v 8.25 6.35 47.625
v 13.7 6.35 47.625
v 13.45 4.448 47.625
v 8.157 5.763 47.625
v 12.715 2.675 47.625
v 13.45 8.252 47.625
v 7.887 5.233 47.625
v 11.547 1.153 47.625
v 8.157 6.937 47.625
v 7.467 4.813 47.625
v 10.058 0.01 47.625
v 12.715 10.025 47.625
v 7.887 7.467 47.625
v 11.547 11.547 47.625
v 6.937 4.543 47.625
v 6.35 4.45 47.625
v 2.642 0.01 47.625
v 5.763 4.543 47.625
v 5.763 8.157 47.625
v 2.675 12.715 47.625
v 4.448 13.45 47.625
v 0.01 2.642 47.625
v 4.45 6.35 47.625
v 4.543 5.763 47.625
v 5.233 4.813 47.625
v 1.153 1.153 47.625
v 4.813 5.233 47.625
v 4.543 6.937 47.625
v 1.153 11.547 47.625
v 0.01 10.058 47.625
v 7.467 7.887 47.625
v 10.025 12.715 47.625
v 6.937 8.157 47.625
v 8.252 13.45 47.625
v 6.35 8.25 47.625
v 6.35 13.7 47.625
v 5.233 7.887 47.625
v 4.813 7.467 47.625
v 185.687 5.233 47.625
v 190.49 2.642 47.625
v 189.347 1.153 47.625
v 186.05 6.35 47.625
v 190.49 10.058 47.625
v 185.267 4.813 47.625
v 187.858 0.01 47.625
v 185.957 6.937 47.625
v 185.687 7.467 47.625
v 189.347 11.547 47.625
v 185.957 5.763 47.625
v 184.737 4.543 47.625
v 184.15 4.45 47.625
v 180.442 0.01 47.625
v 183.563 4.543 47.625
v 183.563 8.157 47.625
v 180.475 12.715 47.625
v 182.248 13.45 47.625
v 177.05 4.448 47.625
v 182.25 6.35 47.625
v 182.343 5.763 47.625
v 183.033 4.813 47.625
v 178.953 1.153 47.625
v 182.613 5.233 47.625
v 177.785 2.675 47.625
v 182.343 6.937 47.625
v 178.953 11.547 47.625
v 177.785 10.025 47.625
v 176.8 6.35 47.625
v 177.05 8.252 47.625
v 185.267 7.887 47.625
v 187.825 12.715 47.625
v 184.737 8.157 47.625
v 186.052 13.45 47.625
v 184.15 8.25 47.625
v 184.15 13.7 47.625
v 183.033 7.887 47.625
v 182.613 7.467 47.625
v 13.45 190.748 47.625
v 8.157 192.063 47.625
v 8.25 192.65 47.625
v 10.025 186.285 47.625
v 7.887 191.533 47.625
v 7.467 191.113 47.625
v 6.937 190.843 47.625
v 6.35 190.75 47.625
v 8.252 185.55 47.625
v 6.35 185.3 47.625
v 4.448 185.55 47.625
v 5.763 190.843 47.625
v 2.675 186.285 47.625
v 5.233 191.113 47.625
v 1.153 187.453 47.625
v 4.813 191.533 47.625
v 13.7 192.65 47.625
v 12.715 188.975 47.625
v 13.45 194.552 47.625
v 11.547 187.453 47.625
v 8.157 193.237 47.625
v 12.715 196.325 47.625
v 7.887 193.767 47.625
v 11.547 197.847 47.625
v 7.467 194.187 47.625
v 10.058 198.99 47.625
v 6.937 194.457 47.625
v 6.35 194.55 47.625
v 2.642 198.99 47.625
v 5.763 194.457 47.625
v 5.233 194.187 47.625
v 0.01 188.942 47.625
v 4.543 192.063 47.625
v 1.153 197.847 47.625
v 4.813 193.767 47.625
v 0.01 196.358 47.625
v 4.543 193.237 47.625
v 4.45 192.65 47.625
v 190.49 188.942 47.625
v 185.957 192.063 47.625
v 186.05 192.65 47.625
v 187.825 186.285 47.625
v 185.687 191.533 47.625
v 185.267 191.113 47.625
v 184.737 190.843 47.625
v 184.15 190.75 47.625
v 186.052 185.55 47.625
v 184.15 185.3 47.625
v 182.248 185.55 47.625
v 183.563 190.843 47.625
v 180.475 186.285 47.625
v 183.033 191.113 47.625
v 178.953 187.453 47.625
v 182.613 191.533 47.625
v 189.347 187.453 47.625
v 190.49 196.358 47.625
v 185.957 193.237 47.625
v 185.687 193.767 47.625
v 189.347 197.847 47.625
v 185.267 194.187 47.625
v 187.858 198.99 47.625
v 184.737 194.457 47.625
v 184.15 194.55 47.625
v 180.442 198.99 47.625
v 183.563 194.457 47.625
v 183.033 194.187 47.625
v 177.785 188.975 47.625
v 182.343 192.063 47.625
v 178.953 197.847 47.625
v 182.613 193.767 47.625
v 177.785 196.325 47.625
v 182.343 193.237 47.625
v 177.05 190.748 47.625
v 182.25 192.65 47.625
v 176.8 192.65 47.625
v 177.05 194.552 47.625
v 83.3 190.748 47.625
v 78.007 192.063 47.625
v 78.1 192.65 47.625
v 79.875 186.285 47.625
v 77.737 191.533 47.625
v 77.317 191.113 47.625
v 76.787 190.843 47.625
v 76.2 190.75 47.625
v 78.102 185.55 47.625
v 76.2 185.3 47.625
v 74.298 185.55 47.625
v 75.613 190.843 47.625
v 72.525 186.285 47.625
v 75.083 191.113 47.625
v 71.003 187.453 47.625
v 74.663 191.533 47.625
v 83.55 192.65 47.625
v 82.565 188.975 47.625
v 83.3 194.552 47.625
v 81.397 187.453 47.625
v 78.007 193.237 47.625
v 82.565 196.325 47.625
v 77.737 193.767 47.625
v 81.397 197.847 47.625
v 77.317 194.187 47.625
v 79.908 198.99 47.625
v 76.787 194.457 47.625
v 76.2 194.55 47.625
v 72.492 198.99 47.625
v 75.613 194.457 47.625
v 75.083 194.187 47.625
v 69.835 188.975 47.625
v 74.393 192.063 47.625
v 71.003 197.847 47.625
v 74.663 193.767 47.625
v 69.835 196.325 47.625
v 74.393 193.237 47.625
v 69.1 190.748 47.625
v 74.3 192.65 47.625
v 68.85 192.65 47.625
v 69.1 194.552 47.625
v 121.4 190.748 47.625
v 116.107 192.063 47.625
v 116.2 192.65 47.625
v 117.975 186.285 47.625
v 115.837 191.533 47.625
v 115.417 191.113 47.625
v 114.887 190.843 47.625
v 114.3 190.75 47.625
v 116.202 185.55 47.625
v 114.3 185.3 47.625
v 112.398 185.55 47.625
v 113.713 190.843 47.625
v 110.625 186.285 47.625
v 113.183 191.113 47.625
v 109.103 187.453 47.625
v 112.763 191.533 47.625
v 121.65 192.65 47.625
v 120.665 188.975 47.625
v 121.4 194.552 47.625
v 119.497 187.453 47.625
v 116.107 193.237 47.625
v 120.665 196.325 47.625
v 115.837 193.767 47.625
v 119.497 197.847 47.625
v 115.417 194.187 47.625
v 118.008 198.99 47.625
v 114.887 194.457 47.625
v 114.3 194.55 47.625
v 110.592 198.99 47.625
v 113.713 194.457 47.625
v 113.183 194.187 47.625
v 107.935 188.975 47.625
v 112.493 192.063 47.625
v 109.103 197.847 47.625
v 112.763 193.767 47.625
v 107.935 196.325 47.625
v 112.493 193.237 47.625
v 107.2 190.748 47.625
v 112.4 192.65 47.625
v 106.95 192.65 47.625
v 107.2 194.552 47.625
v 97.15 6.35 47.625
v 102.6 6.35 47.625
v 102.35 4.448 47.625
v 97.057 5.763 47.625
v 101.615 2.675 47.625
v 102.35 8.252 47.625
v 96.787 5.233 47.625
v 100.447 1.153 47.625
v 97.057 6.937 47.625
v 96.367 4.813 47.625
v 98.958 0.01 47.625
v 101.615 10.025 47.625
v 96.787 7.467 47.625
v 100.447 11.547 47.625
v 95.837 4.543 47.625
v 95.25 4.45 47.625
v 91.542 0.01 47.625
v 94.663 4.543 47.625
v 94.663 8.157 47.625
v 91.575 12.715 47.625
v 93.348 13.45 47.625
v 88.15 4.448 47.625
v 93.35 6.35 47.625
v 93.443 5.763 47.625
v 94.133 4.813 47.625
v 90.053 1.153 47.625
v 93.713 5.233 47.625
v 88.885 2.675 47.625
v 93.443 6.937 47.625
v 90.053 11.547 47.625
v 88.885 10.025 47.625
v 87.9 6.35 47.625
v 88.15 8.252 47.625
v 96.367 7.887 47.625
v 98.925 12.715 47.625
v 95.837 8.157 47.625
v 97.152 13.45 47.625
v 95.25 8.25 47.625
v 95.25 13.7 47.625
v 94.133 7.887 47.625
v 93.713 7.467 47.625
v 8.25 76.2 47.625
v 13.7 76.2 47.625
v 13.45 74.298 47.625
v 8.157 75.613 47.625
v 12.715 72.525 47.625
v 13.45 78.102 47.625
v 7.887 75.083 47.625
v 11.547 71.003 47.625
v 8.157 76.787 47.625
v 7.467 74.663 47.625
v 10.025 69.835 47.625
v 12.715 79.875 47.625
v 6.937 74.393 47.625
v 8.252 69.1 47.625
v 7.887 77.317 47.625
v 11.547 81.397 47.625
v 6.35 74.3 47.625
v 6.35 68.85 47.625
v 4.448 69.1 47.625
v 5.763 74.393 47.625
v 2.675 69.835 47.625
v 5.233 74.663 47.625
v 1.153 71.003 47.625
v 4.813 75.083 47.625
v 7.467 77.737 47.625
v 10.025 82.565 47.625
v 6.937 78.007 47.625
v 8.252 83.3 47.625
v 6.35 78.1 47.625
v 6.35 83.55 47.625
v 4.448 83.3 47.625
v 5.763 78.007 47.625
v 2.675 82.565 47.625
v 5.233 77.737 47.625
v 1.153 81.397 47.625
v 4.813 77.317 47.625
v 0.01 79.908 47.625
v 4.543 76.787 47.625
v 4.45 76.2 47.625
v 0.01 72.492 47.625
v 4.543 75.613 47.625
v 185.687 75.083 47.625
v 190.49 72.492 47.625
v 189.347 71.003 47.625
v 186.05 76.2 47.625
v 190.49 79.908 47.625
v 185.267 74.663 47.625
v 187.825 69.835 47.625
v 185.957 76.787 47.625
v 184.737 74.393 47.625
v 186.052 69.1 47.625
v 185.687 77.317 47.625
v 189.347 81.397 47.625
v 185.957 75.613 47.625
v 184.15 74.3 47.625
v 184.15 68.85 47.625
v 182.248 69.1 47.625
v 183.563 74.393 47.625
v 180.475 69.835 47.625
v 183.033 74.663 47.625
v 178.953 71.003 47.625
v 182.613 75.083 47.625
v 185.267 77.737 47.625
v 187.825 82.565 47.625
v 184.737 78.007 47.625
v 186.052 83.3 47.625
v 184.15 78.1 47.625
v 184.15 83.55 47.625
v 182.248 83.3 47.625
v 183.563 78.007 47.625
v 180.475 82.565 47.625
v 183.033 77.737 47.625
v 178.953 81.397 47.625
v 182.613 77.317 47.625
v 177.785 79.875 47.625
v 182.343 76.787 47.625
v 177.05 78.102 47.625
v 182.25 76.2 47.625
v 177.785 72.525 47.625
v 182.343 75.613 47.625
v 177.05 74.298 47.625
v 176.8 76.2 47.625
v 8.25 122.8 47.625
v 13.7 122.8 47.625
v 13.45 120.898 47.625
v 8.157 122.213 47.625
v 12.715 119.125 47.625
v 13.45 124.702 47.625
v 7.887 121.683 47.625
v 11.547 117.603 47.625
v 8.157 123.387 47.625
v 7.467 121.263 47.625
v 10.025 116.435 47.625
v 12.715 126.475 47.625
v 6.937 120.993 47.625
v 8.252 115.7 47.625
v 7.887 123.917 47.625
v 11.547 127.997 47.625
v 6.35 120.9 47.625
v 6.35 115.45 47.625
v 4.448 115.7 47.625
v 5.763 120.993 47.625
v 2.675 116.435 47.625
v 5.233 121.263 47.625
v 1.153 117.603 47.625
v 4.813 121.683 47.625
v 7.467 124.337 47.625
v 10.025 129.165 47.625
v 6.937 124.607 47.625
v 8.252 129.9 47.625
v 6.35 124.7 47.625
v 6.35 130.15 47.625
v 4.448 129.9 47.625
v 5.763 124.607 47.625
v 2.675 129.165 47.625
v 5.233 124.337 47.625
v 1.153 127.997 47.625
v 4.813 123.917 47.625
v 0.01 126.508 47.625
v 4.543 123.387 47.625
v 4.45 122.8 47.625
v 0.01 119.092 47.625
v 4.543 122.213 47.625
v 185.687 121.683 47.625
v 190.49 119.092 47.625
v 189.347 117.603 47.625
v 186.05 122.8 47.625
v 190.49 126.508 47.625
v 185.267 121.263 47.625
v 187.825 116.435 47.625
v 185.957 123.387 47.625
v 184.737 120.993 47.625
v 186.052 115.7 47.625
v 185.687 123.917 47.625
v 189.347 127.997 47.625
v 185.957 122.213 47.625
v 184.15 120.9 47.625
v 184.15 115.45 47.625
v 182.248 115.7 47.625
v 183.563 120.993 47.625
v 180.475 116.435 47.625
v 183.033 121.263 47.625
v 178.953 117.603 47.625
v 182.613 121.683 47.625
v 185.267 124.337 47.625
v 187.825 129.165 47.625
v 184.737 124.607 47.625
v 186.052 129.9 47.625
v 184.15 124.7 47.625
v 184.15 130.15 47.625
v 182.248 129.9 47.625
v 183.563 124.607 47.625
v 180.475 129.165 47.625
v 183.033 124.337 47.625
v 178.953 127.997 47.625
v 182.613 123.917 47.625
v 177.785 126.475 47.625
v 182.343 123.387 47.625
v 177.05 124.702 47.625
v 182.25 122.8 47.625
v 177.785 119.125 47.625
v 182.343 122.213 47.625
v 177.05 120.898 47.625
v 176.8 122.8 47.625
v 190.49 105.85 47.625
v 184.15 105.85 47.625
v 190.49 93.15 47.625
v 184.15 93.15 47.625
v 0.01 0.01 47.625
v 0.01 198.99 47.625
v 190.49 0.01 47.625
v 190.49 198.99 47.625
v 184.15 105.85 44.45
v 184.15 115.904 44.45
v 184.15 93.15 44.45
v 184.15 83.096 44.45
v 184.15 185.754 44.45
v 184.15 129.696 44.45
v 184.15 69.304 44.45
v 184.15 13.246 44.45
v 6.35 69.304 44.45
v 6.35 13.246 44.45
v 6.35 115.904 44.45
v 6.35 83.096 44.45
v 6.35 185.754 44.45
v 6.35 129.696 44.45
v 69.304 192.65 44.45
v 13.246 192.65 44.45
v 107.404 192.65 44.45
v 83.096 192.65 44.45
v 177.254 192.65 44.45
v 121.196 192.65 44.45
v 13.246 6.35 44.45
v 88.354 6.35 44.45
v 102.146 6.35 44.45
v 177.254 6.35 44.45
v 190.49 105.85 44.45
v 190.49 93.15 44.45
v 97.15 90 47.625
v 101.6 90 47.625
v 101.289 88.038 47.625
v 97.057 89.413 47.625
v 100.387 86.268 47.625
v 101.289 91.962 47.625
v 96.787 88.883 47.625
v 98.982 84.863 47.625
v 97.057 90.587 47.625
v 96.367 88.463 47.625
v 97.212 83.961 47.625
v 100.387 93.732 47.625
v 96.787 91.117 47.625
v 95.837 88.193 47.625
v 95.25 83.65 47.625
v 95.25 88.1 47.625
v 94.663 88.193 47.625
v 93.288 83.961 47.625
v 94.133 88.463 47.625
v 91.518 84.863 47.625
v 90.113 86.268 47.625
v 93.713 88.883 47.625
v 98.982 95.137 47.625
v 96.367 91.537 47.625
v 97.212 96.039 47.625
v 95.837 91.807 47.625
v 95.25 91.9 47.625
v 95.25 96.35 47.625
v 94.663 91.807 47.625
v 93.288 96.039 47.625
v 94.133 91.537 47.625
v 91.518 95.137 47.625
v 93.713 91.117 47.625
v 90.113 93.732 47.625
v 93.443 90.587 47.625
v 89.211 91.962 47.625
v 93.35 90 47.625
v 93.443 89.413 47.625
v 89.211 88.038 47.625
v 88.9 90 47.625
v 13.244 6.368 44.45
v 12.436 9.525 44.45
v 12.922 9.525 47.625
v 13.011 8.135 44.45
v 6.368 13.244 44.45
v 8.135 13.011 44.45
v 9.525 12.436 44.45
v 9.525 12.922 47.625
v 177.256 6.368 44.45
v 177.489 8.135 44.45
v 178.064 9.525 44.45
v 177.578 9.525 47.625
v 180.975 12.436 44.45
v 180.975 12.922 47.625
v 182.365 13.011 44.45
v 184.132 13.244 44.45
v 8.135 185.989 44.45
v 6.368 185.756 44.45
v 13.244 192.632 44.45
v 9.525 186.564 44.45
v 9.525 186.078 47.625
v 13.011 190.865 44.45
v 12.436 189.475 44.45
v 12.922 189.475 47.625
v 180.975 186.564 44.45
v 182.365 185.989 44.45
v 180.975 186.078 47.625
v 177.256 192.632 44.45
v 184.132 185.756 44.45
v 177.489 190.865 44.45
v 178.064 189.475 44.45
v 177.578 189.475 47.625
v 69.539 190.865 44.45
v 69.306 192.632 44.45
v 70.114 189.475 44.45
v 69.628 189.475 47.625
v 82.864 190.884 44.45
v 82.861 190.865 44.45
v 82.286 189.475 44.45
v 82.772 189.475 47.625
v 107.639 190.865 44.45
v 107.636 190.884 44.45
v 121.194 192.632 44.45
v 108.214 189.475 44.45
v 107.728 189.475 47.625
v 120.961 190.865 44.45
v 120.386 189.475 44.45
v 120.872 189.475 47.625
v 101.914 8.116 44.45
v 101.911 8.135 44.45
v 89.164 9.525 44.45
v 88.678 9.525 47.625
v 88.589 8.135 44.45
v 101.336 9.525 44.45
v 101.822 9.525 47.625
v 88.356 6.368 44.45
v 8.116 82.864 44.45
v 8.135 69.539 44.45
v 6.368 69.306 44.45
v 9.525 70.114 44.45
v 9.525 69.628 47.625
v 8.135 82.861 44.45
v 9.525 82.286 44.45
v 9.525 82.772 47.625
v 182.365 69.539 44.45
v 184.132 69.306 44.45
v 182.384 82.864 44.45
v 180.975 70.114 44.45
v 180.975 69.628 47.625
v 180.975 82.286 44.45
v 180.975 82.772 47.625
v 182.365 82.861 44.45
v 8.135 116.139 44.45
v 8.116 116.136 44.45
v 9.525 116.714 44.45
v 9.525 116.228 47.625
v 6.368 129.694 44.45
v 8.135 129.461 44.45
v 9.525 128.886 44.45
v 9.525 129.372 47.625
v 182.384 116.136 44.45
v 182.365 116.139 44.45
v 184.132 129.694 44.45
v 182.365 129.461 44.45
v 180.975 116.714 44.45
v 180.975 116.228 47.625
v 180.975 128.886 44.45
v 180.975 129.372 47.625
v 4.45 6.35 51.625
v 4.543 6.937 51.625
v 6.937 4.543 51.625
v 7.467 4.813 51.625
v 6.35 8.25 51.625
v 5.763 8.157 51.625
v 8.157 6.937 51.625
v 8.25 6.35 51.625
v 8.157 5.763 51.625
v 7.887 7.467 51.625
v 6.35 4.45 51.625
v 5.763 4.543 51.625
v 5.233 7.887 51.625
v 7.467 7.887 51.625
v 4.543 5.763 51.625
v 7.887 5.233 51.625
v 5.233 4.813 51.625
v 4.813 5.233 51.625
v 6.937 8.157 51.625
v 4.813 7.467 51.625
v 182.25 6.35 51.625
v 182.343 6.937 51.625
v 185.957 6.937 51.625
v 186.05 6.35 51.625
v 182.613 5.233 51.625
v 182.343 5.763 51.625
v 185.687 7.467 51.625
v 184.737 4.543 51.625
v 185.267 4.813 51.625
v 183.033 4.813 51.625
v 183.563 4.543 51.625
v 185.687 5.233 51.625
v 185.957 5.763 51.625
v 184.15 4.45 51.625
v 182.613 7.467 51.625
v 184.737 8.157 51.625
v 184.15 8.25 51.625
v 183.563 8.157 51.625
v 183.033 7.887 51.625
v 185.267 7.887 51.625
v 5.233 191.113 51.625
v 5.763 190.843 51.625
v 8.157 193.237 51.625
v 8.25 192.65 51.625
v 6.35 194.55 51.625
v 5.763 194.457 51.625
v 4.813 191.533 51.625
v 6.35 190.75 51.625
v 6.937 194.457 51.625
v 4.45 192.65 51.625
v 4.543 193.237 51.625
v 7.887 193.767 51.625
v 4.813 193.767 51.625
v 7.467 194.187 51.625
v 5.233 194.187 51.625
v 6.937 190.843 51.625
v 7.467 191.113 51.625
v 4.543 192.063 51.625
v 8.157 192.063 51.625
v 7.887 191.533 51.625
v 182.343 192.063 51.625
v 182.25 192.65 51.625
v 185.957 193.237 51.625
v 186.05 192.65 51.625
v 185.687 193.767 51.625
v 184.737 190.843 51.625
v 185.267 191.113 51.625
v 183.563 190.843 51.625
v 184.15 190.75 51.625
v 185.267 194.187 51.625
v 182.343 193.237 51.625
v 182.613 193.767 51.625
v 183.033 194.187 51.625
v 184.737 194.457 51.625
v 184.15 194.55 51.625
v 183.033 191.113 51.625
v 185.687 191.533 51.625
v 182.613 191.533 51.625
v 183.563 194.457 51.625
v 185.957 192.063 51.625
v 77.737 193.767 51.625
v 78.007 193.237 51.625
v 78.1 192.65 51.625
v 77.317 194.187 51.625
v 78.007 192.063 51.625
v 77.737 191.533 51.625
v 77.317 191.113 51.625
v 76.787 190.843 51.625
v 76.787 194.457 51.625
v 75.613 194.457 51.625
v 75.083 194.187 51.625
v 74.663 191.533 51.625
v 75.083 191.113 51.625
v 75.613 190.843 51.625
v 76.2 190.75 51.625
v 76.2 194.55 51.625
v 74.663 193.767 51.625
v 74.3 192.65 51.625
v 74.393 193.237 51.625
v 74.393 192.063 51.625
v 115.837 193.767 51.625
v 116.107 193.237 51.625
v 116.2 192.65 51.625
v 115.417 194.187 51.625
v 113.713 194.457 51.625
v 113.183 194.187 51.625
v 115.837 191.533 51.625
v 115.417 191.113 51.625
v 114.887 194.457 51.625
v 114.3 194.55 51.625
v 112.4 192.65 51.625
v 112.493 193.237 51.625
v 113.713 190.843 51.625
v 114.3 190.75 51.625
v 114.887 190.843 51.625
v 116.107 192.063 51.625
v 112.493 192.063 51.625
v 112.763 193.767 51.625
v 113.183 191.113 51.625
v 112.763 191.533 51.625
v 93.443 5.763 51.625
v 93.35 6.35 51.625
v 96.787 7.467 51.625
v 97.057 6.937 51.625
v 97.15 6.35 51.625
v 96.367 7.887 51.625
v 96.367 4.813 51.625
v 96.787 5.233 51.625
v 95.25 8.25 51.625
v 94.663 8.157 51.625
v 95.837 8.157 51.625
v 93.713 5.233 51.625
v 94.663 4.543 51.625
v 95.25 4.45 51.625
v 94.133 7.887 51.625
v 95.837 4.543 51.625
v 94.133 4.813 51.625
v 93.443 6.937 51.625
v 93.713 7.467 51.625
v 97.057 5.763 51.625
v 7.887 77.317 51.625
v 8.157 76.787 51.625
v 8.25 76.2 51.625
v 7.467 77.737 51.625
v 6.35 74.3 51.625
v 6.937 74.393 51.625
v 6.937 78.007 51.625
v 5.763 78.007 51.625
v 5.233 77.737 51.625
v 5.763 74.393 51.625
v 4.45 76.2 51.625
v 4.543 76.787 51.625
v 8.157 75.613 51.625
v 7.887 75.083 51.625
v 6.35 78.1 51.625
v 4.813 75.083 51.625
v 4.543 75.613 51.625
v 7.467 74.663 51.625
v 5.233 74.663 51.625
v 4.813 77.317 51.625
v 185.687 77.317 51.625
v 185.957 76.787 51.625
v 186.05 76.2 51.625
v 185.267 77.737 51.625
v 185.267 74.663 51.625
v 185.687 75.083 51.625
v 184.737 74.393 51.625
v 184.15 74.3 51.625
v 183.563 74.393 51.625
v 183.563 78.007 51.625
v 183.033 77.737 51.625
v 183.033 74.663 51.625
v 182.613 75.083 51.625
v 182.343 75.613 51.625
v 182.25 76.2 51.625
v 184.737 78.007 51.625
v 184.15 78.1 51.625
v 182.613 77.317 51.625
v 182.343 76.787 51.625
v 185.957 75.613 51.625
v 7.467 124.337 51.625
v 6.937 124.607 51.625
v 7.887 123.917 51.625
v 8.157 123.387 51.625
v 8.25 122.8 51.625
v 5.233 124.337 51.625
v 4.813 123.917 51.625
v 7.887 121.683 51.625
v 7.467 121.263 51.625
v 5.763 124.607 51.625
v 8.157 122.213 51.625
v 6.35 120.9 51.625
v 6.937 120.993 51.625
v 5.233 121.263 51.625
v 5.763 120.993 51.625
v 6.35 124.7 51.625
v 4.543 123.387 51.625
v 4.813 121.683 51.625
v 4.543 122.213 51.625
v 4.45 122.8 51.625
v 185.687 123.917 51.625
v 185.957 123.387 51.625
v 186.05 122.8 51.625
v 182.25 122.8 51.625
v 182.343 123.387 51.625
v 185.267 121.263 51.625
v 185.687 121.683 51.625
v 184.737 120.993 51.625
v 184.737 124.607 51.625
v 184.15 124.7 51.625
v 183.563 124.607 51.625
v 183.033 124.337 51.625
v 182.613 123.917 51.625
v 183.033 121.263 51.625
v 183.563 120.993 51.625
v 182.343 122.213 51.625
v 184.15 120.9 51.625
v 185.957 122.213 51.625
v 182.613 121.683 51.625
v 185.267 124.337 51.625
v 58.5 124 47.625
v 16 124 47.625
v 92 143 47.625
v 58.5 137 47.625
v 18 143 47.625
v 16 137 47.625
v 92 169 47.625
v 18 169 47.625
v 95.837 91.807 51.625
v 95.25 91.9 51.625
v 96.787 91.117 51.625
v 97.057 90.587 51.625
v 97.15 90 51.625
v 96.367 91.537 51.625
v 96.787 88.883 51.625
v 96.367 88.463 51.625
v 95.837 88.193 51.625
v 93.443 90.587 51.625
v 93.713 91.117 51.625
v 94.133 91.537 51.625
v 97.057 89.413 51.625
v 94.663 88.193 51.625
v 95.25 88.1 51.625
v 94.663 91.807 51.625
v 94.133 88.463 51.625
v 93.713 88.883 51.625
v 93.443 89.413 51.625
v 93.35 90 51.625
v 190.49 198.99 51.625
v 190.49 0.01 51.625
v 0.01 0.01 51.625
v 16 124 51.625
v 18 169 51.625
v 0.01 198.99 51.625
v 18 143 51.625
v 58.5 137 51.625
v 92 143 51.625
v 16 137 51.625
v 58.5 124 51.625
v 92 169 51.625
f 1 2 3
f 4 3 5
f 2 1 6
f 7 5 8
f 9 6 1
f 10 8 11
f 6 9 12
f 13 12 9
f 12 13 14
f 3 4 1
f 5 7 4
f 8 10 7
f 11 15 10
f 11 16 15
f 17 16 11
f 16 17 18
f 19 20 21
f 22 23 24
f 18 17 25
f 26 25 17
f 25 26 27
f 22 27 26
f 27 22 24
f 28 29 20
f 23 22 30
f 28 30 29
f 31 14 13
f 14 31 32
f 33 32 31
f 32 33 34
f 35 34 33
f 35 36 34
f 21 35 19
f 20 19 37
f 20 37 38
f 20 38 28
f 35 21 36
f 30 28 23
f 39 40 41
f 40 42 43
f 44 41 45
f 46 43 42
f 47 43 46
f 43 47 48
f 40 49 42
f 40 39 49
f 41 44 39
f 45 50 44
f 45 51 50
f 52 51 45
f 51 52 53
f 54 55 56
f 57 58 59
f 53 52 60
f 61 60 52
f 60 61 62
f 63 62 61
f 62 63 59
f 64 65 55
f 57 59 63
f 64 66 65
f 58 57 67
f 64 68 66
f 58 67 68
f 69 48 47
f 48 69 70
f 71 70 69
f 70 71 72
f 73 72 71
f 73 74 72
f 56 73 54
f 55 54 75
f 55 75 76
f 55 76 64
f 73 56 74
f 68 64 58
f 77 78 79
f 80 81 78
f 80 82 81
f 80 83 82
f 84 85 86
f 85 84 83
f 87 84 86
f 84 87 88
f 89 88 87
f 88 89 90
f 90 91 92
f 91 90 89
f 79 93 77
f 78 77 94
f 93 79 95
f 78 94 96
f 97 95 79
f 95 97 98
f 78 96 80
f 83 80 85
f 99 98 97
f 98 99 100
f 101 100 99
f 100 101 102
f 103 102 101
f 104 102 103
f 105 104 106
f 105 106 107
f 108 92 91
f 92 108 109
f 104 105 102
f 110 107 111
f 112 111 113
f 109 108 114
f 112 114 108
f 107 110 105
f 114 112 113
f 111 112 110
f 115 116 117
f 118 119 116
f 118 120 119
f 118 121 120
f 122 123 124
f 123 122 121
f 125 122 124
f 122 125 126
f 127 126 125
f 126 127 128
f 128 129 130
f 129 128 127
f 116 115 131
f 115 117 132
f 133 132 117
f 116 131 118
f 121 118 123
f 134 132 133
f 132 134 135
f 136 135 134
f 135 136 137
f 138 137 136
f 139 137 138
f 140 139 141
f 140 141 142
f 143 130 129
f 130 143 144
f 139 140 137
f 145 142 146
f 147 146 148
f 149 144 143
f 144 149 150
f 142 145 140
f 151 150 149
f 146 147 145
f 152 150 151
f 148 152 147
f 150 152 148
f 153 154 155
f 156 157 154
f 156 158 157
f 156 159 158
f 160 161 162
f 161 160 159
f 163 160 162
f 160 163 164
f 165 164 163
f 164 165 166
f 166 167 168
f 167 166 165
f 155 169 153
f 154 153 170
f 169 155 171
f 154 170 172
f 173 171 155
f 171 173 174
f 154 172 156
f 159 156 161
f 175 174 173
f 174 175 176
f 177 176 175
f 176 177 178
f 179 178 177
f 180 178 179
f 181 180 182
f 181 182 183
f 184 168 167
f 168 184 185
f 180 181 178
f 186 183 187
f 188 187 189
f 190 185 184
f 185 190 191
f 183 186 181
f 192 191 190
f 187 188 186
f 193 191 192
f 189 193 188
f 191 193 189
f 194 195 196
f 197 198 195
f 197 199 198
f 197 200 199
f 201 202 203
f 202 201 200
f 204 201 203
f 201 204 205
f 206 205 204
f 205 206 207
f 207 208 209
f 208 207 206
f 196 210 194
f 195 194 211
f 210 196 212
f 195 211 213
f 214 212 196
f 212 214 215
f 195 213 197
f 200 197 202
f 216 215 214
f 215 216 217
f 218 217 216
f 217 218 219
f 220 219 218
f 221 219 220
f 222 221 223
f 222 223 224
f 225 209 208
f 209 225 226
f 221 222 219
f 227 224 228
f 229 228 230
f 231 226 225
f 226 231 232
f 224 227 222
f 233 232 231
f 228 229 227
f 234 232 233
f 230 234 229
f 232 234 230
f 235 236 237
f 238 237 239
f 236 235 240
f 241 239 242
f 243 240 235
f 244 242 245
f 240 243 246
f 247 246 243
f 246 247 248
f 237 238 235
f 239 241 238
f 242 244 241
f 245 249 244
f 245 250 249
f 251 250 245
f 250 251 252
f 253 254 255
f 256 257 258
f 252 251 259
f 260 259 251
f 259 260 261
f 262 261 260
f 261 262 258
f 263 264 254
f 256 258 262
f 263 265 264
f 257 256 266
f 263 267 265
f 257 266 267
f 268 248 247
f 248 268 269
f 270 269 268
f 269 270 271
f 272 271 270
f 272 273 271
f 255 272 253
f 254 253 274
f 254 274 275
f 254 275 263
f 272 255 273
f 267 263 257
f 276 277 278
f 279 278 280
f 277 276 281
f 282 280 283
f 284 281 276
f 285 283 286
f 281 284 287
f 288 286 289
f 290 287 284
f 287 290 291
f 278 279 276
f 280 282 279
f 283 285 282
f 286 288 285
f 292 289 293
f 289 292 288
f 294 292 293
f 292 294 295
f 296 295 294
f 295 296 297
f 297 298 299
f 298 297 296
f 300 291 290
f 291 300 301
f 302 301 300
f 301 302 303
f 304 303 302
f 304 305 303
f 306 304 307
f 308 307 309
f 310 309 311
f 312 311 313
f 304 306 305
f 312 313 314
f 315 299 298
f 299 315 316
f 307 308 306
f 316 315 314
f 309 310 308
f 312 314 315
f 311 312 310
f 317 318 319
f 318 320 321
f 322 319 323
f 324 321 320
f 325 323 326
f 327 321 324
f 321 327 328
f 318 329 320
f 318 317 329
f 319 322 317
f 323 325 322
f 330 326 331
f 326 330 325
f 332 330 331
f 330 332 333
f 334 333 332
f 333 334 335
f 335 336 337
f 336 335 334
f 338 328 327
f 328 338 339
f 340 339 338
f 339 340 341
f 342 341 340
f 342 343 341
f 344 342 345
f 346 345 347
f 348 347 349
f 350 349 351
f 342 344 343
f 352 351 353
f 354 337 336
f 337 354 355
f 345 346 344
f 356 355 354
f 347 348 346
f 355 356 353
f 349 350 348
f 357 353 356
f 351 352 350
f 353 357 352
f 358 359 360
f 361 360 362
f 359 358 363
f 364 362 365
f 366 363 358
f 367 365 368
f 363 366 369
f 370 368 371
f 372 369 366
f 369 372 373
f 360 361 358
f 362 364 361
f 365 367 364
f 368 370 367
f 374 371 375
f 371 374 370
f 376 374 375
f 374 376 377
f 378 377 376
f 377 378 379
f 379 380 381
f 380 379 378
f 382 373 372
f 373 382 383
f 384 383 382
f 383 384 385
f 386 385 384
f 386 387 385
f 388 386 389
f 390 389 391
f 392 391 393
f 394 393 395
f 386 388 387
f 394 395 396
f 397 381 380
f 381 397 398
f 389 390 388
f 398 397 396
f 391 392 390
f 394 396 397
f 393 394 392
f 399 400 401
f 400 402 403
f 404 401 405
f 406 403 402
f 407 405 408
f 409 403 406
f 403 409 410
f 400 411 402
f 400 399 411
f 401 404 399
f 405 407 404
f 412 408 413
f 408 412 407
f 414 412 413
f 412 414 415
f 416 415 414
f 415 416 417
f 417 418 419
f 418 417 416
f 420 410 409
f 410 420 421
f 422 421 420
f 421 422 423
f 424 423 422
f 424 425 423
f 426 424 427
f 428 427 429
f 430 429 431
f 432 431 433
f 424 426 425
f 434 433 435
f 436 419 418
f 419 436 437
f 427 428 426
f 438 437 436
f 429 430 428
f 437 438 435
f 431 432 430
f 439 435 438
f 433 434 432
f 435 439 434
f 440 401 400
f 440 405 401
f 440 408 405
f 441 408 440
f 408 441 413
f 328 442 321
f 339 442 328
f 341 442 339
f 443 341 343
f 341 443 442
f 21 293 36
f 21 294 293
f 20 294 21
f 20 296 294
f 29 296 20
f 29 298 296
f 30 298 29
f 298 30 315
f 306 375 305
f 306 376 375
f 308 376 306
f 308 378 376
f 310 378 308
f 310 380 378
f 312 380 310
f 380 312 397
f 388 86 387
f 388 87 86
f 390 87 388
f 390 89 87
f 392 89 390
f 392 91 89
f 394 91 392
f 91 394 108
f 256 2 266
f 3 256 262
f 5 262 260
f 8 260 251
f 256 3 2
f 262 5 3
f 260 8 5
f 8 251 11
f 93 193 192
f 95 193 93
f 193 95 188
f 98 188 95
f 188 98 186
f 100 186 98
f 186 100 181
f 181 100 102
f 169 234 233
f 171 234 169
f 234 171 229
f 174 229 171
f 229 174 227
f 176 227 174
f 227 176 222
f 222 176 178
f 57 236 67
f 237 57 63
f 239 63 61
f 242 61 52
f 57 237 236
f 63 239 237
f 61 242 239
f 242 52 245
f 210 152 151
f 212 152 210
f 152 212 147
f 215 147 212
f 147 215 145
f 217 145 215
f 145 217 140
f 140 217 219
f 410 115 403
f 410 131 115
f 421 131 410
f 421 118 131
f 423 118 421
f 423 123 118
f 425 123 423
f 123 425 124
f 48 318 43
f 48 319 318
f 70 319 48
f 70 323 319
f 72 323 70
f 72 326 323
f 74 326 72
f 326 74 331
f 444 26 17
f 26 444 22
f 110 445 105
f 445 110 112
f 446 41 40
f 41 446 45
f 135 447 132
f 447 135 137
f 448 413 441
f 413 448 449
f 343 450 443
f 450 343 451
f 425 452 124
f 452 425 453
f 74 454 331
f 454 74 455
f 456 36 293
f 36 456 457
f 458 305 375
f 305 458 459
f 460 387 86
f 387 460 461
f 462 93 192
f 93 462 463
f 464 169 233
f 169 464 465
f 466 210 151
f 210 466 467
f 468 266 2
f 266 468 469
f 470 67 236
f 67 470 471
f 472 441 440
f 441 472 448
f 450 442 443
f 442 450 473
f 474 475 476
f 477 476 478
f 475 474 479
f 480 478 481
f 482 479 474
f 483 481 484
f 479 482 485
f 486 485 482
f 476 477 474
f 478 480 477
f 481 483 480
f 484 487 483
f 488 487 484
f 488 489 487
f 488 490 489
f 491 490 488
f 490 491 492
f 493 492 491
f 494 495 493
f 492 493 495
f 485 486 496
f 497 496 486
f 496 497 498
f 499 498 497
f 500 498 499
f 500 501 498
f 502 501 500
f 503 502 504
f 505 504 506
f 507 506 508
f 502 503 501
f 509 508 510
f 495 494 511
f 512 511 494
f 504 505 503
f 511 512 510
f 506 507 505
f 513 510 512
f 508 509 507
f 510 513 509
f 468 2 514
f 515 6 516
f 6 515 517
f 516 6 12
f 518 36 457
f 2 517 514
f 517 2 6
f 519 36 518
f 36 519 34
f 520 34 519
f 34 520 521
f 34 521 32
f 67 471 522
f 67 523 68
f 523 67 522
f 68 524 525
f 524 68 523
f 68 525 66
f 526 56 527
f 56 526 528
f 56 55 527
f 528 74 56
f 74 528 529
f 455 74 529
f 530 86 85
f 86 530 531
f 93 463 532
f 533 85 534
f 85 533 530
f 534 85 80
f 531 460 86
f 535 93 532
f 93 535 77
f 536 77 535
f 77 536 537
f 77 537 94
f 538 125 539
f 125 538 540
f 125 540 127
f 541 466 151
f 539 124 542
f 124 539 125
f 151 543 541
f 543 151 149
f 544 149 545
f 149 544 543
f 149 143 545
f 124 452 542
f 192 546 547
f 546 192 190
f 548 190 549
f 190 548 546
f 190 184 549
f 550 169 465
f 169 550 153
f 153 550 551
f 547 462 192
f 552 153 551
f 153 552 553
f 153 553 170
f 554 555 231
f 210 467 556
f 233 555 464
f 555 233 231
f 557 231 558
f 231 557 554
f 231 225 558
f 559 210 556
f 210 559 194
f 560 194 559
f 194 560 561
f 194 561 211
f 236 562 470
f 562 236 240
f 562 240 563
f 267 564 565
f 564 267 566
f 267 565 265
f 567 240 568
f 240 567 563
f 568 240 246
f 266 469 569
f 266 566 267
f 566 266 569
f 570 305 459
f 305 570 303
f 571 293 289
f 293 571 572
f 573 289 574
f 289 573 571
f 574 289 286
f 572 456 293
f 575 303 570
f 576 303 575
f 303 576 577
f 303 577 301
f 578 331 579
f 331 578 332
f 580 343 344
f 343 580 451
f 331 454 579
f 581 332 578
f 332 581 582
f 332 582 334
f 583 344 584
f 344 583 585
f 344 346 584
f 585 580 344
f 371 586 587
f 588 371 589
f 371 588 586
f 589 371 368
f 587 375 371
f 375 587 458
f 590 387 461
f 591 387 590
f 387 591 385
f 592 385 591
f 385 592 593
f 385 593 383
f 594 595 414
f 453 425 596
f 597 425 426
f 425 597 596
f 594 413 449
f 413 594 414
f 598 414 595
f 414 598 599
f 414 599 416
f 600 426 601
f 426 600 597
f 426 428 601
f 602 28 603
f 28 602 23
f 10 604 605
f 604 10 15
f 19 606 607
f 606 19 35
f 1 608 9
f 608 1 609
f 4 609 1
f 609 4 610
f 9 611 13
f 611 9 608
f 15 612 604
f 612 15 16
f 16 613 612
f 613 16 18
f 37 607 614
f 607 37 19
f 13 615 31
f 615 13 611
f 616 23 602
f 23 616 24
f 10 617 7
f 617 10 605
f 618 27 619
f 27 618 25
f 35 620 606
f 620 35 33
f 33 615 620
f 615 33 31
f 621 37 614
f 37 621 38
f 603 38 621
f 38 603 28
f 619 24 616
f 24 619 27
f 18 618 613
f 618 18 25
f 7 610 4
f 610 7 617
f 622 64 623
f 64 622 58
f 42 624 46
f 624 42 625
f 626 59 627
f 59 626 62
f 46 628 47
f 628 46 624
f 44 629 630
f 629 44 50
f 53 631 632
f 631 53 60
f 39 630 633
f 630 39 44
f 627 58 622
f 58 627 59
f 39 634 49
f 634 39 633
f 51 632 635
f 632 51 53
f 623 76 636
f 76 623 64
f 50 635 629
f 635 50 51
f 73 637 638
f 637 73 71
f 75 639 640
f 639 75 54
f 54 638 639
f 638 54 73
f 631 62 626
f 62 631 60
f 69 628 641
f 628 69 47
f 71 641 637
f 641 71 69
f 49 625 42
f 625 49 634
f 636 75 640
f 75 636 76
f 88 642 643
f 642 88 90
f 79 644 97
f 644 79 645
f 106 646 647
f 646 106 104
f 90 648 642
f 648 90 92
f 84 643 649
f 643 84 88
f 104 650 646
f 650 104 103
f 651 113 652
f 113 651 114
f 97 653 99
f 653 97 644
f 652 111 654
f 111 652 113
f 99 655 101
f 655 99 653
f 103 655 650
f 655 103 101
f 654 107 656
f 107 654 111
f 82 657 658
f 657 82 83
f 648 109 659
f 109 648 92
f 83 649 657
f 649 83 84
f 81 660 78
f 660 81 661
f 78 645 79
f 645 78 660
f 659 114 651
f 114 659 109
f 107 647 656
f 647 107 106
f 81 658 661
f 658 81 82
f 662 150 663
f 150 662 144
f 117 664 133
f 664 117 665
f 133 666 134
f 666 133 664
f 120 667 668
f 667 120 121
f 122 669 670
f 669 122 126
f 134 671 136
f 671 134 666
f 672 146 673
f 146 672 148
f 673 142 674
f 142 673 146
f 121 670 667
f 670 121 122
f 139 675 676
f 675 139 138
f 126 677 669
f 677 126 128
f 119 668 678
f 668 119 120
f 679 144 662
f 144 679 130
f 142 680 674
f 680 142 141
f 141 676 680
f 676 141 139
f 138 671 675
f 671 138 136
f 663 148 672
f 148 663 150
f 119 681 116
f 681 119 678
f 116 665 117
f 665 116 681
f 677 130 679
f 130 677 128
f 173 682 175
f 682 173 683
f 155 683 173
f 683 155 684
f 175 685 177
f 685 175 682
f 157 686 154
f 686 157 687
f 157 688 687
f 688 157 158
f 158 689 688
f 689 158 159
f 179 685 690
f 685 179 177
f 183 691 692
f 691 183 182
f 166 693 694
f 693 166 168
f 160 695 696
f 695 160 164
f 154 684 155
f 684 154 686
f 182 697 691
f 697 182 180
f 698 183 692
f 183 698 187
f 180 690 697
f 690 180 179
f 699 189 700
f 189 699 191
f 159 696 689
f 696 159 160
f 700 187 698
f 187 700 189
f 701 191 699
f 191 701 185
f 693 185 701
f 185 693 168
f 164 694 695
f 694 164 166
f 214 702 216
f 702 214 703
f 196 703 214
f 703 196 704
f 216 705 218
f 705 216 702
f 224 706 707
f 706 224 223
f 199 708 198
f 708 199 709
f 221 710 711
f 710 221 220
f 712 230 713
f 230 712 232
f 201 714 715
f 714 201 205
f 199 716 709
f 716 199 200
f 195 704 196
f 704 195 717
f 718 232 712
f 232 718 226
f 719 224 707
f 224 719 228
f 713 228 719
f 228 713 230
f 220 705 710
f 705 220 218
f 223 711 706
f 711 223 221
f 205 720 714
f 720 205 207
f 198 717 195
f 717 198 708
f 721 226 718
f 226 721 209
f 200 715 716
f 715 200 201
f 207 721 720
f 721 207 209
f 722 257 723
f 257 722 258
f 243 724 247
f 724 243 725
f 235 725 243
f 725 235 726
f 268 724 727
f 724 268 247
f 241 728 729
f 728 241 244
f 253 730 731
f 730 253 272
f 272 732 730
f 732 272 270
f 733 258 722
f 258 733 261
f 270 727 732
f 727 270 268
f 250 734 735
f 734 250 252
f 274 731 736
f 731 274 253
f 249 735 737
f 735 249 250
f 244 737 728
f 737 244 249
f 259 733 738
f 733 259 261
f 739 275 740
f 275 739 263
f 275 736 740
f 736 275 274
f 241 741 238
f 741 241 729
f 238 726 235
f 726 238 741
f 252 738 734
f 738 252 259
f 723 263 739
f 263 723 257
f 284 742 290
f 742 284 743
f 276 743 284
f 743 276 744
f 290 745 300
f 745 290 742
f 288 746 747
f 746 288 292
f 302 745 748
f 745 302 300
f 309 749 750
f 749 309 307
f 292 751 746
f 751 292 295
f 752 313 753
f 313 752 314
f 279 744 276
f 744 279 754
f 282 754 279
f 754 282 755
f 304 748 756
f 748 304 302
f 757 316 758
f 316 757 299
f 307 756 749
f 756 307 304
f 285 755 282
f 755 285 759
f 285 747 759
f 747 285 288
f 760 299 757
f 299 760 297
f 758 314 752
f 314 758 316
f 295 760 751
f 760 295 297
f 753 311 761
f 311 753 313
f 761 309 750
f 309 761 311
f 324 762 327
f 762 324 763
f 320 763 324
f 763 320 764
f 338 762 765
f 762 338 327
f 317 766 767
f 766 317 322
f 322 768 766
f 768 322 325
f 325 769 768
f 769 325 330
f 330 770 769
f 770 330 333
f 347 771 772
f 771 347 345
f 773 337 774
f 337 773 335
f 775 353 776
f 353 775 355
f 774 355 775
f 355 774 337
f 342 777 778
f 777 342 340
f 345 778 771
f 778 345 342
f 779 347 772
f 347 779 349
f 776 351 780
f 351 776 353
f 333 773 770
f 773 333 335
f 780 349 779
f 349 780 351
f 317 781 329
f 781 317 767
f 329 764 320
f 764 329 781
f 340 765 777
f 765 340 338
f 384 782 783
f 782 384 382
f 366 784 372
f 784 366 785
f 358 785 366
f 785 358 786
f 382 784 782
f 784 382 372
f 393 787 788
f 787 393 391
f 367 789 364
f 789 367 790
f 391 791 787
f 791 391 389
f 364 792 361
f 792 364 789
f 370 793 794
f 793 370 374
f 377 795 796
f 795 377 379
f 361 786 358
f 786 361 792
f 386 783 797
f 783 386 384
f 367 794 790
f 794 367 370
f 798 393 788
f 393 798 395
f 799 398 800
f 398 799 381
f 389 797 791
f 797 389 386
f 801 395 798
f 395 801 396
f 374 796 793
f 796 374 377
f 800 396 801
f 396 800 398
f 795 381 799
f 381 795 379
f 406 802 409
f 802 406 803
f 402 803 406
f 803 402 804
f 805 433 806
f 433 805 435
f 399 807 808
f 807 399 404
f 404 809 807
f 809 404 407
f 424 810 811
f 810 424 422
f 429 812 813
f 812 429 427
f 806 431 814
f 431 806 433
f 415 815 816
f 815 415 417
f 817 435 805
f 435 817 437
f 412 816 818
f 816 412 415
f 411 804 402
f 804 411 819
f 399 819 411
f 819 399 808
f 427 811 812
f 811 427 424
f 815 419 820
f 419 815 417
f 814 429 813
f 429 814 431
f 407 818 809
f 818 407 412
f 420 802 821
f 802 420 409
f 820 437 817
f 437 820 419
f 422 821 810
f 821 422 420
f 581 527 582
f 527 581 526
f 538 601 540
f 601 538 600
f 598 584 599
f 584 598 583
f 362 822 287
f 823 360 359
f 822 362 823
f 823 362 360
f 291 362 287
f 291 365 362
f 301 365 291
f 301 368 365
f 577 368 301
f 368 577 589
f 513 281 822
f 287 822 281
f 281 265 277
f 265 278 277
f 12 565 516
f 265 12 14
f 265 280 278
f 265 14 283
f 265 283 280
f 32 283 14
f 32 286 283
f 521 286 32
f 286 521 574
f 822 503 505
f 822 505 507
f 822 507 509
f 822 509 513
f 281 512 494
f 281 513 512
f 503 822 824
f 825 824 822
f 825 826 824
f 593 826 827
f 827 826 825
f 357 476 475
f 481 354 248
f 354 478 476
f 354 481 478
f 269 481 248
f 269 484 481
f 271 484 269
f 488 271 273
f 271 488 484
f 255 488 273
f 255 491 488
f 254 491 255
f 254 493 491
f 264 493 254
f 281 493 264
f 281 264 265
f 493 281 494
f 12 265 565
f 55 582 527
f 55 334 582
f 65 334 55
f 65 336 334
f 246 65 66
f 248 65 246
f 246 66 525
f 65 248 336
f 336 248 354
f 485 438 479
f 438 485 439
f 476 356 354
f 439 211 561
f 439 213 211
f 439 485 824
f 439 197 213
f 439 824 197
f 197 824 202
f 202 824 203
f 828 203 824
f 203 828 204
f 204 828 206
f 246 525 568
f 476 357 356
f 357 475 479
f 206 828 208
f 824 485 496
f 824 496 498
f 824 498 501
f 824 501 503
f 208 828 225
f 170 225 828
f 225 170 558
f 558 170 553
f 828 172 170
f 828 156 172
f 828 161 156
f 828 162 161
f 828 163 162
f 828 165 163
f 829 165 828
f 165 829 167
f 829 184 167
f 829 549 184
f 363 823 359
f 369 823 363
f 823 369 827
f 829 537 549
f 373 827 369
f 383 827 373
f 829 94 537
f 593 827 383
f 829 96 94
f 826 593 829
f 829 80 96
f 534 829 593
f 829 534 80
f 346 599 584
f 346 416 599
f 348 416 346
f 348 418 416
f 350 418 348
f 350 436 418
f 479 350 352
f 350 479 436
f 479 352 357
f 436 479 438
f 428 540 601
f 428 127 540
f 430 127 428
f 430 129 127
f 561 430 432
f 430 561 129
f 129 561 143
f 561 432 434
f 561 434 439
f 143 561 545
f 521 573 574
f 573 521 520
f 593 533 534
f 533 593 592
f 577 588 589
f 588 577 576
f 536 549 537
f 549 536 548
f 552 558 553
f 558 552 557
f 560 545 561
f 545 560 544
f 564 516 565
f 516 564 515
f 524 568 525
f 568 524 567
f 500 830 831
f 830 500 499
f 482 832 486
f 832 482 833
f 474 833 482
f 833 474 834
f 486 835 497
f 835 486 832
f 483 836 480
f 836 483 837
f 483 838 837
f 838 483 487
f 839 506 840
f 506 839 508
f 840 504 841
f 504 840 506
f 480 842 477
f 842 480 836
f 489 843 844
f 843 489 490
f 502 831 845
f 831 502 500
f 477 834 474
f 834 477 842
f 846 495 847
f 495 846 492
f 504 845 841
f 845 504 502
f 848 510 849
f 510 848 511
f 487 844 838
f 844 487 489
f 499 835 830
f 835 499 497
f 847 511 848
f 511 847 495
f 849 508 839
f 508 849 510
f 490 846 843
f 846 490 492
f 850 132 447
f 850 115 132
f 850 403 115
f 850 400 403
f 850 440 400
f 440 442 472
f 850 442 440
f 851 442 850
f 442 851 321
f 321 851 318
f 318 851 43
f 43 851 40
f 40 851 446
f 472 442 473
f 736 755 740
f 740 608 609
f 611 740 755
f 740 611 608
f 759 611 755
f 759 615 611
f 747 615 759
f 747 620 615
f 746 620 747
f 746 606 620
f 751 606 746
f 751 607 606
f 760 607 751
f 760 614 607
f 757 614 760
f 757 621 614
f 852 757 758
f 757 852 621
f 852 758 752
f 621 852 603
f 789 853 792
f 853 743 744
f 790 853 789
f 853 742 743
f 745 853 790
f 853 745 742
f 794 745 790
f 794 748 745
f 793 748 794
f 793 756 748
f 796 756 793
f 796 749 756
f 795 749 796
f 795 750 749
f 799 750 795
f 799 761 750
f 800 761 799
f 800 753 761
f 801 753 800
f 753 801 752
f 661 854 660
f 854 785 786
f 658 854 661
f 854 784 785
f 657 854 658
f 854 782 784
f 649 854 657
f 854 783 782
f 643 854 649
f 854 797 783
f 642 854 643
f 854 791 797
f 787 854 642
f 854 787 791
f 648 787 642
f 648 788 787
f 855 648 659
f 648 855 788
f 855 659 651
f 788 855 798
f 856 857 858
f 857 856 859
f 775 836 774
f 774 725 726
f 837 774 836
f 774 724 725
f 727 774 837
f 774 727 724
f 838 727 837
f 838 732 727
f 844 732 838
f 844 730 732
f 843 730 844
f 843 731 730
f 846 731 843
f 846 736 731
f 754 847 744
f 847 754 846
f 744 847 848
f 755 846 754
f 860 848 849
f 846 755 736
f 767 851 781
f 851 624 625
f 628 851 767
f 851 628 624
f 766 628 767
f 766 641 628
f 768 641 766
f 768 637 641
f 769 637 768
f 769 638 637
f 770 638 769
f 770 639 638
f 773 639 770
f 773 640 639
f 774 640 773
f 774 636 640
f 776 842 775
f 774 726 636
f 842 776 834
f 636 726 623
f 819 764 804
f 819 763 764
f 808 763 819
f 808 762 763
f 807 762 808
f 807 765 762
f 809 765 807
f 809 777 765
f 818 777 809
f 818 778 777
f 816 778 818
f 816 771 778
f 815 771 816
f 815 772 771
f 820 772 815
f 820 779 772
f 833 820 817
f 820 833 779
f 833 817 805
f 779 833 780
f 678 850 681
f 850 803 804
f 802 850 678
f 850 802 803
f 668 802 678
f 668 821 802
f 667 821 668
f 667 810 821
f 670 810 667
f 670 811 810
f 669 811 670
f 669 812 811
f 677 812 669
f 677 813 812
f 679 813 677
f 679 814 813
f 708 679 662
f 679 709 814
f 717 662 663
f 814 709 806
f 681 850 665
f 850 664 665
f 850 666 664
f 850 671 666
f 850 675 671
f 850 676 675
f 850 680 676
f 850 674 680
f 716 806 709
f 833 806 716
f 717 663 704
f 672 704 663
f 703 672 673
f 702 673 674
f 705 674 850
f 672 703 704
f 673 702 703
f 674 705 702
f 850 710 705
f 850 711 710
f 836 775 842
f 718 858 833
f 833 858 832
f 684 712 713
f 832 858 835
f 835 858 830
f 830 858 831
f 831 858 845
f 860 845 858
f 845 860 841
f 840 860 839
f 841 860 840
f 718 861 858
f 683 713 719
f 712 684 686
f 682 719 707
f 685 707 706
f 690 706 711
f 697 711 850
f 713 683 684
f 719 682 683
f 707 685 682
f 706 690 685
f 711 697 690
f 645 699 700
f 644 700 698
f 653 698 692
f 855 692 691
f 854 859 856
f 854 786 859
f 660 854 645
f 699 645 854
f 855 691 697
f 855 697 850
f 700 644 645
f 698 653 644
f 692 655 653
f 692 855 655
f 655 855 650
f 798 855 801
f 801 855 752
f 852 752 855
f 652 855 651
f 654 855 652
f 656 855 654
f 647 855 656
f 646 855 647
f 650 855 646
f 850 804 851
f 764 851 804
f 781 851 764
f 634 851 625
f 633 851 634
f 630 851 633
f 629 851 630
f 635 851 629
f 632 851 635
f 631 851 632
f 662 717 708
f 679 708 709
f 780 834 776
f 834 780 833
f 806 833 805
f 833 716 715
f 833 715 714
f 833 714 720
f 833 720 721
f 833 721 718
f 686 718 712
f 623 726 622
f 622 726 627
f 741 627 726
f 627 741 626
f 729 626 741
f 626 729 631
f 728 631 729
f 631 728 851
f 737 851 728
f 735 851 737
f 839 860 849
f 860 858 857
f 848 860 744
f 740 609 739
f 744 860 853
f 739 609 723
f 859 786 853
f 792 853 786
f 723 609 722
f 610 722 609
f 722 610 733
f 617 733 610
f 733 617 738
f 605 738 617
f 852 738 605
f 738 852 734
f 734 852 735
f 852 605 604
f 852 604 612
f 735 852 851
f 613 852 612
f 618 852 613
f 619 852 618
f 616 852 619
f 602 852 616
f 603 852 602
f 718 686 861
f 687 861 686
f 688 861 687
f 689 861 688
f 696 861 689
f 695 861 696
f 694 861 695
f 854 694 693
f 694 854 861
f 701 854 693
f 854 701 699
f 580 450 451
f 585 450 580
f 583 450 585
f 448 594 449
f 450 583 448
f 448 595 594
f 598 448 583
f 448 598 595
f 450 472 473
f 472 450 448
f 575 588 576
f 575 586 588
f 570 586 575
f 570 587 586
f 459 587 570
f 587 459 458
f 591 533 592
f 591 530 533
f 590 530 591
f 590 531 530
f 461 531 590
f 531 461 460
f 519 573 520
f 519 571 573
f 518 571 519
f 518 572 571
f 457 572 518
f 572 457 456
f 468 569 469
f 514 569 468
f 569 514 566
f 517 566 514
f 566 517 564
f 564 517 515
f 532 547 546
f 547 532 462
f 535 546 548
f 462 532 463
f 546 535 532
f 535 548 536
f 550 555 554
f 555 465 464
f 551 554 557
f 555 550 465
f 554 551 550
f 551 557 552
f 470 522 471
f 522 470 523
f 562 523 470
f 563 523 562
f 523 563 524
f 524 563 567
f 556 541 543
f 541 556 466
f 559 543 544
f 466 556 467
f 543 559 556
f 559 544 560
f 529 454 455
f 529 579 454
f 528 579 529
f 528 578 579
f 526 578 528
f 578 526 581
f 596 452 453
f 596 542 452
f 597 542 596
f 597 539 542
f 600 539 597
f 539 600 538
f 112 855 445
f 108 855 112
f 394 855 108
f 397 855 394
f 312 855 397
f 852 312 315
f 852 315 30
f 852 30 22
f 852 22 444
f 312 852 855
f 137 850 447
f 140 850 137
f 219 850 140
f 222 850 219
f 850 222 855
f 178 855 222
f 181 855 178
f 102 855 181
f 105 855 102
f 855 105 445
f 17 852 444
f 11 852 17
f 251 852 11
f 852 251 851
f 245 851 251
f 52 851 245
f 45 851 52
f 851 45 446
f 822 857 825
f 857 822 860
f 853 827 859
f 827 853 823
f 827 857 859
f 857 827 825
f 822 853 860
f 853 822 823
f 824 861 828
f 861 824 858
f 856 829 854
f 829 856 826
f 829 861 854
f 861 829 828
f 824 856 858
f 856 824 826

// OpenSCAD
// TO DO:
//
// Remove lid screws that will interfere with PLX
// Add back the rest of the lid screws
// Make the rest of the bosses go through the floor
// Make the wiring notch open all the way to the top
// Make the wiring notch extend down to the top of the nearest boss
// Remove 2 of the 5 wiring bosses

// Dimensions
totalWidth = 190.5; // 7.5"
totalLength = 199;
inch = 25.4;
halfInch = inch / 2;
quarterInch = inch / 4; // .25"
floorDepth = quarterInch / 2;  
edgeWidth = quarterInch;
bossHeight = quarterInch / 2;
cavityDepth = (2 * inch) - (2 * floorDepth);
boltRadius = 1.4;
dividerHeight = 80; // 56
dividerDepth = inch;
arduinoX = 29.5;
arduinoY = totalLength - (65 + (2 * edgeWidth));
lidThickness = quarterInch / 2;
lidScrewHoleDepth = 10; // 12.5;
lidScrewLidBoltRadius = boltRadius + 0.5; 
lidScrewCaseBoltRadius = boltRadius; 
lidScrewMagnetRadius = boltRadius; 
centerSupportY = 90;

plxHeight = 57;
plxEdgeWidth = 3;
plxEdgeHeight = 4.5;

module plxPost(x, y, solid)
{
    translate([x, y, dividerDepth / 2])
    {
        if (solid)
        {
            cylinder(h = dividerDepth, r = quarterInch, center = true);
        }
        else
        {
            cylinder(h = dividerDepth + 1, r = boltRadius, center = true);
        }
    }
}

module plxBlock(x, y, l)
{
    translate([x, y, dividerDepth / 2])
    {
        cube([halfInch, l, dividerDepth], center = true); 
    }
}


// Boss
module boss(x, y, solid)
{
    translate ([x, y, floorDepth])
    {
        if (solid)
        {
            cylinder(h = bossHeight + floorDepth, r = 3.25, center = true);
        }
        else
        {
            cylinder(h = inch * 2, r = boltRadius, center = true);
        }
    }
}

module anchor(x, y)
{
    translate([x - 5, y, floorDepth])
    {
        cube([5, 10, 6], center = true);
    }
    
    translate([x + 5, y, floorDepth])
    {
        cube([5, 10, 6], center = true);
    }

    translate([x, y, floorDepth + 4])
    {
        cube([15, 10, 2], center = true);
    }
}

plxDeviceHeight = 33;
lidScrewHeight = cavityDepth + floorDepth - plxDeviceHeight;
lidScrewZ = cavityDepth + floorDepth - (lidScrewHeight / 2);

module lidScrew(x, y, positive, lid)
{
    if (positive)
    {
        if (lid)
        {
            translate([x, y, (cavityDepth / 2) + floorDepth])
                cylinder(h = cavityDepth, r1 = 1, r2 = quarterInch + 1, , center = true);
        }
        else
        {
            translate([x, y, lidScrewZ])
                cylinder(h = lidScrewHeight, r1 = 1, r2 = quarterInch, , center = true);
        }
    }
    else
    {
        if (lid)
        {
            translate([x, y, cavityDepth])
                 cylinder(h = lidScrewHoleDepth * 2, r = lidScrewLidBoltRadius, center = true, , $fn = 20);

        }
        else
        {
            translate([x, y, lidScrewZ + 1])
                cylinder(h = lidScrewHeight, r = lidScrewCaseBoltRadius, center = true, $fn = 5);

        }
    }
}

module lidScrews(positive, lid)
{
    lidScrew(edgeWidth, edgeWidth, positive, lid);
    lidScrew(totalWidth - edgeWidth, edgeWidth, positive, lid);
    lidScrew(edgeWidth, totalLength - edgeWidth, positive, lid);
    lidScrew(totalWidth - edgeWidth, totalLength - edgeWidth, positive, lid);
    
    //lidScrew(totalWidth / 2, totalLength - edgeWidth, positive);
    lidScrew(3 * inch, totalLength - edgeWidth, positive, lid);
    lidScrew(totalWidth - (3 * inch), totalLength - edgeWidth, positive, lid);
    
    lidScrew(totalWidth / 2, edgeWidth, positive, lid);
    
    lidScrew(edgeWidth, 3 * inch, positive, lid);
    lidScrew(totalWidth - edgeWidth, 3 * inch, positive, lid);

    lidScrew(edgeWidth, totalLength - (3 * inch), positive, lid);
    lidScrew(totalWidth - edgeWidth, totalLength - (3 * inch), positive, lid);
}

arduinoHolesWidth = 92;
arduinoHolesHeight = 63;

module arduinoBossesSingleRow(solid)
{
    boss(0, 0, solid);
    boss(arduinoHolesWidth, 0, solid);
    boss(arduinoHolesWidth / 2, 0, solid);
}

module arduinoDue(solid)
{
    arduinoBossesSingleRow(solid);
    
    translate([0, arduinoHolesHeight, 0])
    {
        arduinoBossesSingleRow(solid);
    }
}

module bosses(solid)
{
/*    // Voltage regulator
    translate([2 * quarterInch, 175, 0])
    {
        boss (0, 0, solid); //  left
        boss (41.275, 0, solid); //  right
    }*/

    // Future expansion
    translate([135, 174, 0])
    {
        boss (5, 0, solid); //  left
        boss (35, 0, solid); //  right
    }

    translate([135, 124, 0])
    {
        boss (5, 0, solid); //  left
        boss (35, 0, solid); //  right
    }
    
    if (solid)
    {
        // Wiring anchors
        translate([0, totalLength / 2, 0])
        {           
            anchor(20, 0);
            anchor(totalWidth / 2 - 25, 0);
            anchor(totalWidth / 2 + 25, 0);
            anchor(totalWidth - 20, 0);
        }
    }
    
    boss(totalWidth / 2, 25.5, solid);
    boss(totalWidth / 2, 66.5, solid);
    
    boss(totalWidth / 2 - 11, totalLength / 2 - 15, solid);
    boss(totalWidth / 2 + 11, totalLength / 2 - 15, solid);    
}

module wiringPassage()
{
    // Wiring passage
    translate([
        totalWidth - (edgeWidth / 2), 
        totalLength / 2, 
        30])
    {
        cube([edgeWidth + 1, inch / 2, cavityDepth ], center = true);
    }    
}

module box()
{
    difference()
    {
        union()
        {
            lidScrews(true, false);
            
            // Box
            difference()
            {
                union()
                {
                    cube([totalWidth, totalLength, floorDepth + cavityDepth], false);
                }

                // Hollow out
                translate([edgeWidth, edgeWidth, floorDepth])
                {
                    cube([
                        totalWidth - (2 * edgeWidth),
                        totalLength - (2 * edgeWidth),
                        cavityDepth + 1], 
                        false);
                }
                wiringPassage();
            }  

            bosses(true);
            
            // Arduino
            translate([arduinoX, arduinoY, 0])
            {
                //arduinoDue_Old();
                arduinoDue(1);
            }

            // Center support
            translate([totalWidth / 2, centerSupportY, floorDepth + cavityDepth / 2])
            {
                difference()
                {
                    cylinder(h = cavityDepth, r = quarterInch, center = true);
                    cylinder(h = cavityDepth + 1, r = boltRadius, center = true);
                }
            }
            
            // PLX edges
            translate([totalWidth / 4, edgeWidth + plxHeight + plxEdgeHeight / 2, floorDepth + plxEdgeHeight / 2])
            {
                cube ([2 * inch, plxEdgeWidth, plxEdgeHeight], center = true);
            }

            translate([3 * totalWidth / 4, edgeWidth + plxHeight + plxEdgeHeight / 2, floorDepth + plxEdgeHeight / 2])
            {
                cube ([2 * inch, plxEdgeWidth, plxEdgeHeight], center = true);
            }
                       
            difference()
            {
                union()
                {
                    plxBlock(totalWidth / 2, 7, 14);
                    plxPost(totalWidth / 2, 14, true);
            
                    plxPost(totalWidth / 2, 78, true);
                    plxBlock(totalWidth / 2, 84, 12);
                }
                
                plxPost(totalWidth / 2, 14, false);            
                plxPost(totalWidth / 2, 78, false);
            }
        }
        
        translate([arduinoX, arduinoY, 0])
        {
            arduinoDue(0);
        }
        
        lidScrews(false, false);
        
        bosses(false);

    /*    
        // Remove lower half
        translate([
            totalWidth / 2, 
            0, 
            floorDepth / 2])
        {
            cube([totalWidth + 2, 8.6 * inch, inch * 3], true);
        }*/
    }
}

lidRimWidth = 1.5 * edgeWidth;

module duct(ductWidth, ductHeight, thickness, scale, depth, positive)
{
    if (positive)
    {
        linear_extrude(height = depth, center = true, scale = scale)
            square([ductWidth, ductHeight], center = true);
    }
    else
    {
        translate([0, 0, -0.01])
        {
            linear_extrude(height = depth + 0.03, center = true, scale = scale)
                square([ductWidth - thickness, ductHeight - thickness], center = true);
        }
    }
}


module lid()
{
    difference()
    {
        union()
        {
            // button access
            translate([85, 125, floorDepth+cavityDepth - 1])
            {
                //duct(45, 20, 2, [1.1, 1.3], 10, true);
            }

            // screen access
            translate([101, 150, floorDepth+cavityDepth + 2])
            {
                
                //duct(80, 35, 5, [1.1, 1.3], 4, true);
            }

            difference()
            {
                union()
                {        
                    translate([0.01, 0.01, (floorDepth + cavityDepth) - lidThickness])
                    {
                        cube([totalWidth - 0.02, totalLength - 0.02, lidThickness + 4], false);
                    }
                }
                
                union()
                {
                    translate([lidRimWidth, lidRimWidth, (cavityDepth - 1)])
                    {
                        cube([totalWidth - 2 * lidRimWidth, totalLength - 2 * lidRimWidth, lidThickness + 1], false);
                    }
                                
                    box();
                    lidScrews(true , true);            
                    translate([0, 0, 0.5 * inch])
                    {
                        lidScrews(false, true);
                    }
                    
                    // center support
                    lidScrew(totalWidth / 2, centerSupportY, 0, 1);
                }
            }
        }
        
        // button access
        translate([16, 124, floorDepth+cavityDepth - 3])
        {
            cube([58.5-16, 137-124, 25], false);
        }
    
        // screen access
        translate([18, 143, floorDepth+cavityDepth - 3])
        {
            cube([92-18, 168-142, 20], false);
        }        
    }
}

module cornerPreview()
{
    difference()
    {
        //box();
        lid();
        union()
        {
            translate([-1, 20, -1])
            {
                cube([12 * inch, 12 * inch, 4 * inch], false);
            }
            
            translate([20, -1, -1])
            {
                cube([12 * inch, 12 * inch, 4 * inch], false);
            }
            
            translate([-inch / 2, -inch / 2, -6])
            {
                cube([2 * inch, 2 * inch, inch * 1.33], false);
            }
            
        }
    }
}

lid();
//box();

//cornerPreview();
